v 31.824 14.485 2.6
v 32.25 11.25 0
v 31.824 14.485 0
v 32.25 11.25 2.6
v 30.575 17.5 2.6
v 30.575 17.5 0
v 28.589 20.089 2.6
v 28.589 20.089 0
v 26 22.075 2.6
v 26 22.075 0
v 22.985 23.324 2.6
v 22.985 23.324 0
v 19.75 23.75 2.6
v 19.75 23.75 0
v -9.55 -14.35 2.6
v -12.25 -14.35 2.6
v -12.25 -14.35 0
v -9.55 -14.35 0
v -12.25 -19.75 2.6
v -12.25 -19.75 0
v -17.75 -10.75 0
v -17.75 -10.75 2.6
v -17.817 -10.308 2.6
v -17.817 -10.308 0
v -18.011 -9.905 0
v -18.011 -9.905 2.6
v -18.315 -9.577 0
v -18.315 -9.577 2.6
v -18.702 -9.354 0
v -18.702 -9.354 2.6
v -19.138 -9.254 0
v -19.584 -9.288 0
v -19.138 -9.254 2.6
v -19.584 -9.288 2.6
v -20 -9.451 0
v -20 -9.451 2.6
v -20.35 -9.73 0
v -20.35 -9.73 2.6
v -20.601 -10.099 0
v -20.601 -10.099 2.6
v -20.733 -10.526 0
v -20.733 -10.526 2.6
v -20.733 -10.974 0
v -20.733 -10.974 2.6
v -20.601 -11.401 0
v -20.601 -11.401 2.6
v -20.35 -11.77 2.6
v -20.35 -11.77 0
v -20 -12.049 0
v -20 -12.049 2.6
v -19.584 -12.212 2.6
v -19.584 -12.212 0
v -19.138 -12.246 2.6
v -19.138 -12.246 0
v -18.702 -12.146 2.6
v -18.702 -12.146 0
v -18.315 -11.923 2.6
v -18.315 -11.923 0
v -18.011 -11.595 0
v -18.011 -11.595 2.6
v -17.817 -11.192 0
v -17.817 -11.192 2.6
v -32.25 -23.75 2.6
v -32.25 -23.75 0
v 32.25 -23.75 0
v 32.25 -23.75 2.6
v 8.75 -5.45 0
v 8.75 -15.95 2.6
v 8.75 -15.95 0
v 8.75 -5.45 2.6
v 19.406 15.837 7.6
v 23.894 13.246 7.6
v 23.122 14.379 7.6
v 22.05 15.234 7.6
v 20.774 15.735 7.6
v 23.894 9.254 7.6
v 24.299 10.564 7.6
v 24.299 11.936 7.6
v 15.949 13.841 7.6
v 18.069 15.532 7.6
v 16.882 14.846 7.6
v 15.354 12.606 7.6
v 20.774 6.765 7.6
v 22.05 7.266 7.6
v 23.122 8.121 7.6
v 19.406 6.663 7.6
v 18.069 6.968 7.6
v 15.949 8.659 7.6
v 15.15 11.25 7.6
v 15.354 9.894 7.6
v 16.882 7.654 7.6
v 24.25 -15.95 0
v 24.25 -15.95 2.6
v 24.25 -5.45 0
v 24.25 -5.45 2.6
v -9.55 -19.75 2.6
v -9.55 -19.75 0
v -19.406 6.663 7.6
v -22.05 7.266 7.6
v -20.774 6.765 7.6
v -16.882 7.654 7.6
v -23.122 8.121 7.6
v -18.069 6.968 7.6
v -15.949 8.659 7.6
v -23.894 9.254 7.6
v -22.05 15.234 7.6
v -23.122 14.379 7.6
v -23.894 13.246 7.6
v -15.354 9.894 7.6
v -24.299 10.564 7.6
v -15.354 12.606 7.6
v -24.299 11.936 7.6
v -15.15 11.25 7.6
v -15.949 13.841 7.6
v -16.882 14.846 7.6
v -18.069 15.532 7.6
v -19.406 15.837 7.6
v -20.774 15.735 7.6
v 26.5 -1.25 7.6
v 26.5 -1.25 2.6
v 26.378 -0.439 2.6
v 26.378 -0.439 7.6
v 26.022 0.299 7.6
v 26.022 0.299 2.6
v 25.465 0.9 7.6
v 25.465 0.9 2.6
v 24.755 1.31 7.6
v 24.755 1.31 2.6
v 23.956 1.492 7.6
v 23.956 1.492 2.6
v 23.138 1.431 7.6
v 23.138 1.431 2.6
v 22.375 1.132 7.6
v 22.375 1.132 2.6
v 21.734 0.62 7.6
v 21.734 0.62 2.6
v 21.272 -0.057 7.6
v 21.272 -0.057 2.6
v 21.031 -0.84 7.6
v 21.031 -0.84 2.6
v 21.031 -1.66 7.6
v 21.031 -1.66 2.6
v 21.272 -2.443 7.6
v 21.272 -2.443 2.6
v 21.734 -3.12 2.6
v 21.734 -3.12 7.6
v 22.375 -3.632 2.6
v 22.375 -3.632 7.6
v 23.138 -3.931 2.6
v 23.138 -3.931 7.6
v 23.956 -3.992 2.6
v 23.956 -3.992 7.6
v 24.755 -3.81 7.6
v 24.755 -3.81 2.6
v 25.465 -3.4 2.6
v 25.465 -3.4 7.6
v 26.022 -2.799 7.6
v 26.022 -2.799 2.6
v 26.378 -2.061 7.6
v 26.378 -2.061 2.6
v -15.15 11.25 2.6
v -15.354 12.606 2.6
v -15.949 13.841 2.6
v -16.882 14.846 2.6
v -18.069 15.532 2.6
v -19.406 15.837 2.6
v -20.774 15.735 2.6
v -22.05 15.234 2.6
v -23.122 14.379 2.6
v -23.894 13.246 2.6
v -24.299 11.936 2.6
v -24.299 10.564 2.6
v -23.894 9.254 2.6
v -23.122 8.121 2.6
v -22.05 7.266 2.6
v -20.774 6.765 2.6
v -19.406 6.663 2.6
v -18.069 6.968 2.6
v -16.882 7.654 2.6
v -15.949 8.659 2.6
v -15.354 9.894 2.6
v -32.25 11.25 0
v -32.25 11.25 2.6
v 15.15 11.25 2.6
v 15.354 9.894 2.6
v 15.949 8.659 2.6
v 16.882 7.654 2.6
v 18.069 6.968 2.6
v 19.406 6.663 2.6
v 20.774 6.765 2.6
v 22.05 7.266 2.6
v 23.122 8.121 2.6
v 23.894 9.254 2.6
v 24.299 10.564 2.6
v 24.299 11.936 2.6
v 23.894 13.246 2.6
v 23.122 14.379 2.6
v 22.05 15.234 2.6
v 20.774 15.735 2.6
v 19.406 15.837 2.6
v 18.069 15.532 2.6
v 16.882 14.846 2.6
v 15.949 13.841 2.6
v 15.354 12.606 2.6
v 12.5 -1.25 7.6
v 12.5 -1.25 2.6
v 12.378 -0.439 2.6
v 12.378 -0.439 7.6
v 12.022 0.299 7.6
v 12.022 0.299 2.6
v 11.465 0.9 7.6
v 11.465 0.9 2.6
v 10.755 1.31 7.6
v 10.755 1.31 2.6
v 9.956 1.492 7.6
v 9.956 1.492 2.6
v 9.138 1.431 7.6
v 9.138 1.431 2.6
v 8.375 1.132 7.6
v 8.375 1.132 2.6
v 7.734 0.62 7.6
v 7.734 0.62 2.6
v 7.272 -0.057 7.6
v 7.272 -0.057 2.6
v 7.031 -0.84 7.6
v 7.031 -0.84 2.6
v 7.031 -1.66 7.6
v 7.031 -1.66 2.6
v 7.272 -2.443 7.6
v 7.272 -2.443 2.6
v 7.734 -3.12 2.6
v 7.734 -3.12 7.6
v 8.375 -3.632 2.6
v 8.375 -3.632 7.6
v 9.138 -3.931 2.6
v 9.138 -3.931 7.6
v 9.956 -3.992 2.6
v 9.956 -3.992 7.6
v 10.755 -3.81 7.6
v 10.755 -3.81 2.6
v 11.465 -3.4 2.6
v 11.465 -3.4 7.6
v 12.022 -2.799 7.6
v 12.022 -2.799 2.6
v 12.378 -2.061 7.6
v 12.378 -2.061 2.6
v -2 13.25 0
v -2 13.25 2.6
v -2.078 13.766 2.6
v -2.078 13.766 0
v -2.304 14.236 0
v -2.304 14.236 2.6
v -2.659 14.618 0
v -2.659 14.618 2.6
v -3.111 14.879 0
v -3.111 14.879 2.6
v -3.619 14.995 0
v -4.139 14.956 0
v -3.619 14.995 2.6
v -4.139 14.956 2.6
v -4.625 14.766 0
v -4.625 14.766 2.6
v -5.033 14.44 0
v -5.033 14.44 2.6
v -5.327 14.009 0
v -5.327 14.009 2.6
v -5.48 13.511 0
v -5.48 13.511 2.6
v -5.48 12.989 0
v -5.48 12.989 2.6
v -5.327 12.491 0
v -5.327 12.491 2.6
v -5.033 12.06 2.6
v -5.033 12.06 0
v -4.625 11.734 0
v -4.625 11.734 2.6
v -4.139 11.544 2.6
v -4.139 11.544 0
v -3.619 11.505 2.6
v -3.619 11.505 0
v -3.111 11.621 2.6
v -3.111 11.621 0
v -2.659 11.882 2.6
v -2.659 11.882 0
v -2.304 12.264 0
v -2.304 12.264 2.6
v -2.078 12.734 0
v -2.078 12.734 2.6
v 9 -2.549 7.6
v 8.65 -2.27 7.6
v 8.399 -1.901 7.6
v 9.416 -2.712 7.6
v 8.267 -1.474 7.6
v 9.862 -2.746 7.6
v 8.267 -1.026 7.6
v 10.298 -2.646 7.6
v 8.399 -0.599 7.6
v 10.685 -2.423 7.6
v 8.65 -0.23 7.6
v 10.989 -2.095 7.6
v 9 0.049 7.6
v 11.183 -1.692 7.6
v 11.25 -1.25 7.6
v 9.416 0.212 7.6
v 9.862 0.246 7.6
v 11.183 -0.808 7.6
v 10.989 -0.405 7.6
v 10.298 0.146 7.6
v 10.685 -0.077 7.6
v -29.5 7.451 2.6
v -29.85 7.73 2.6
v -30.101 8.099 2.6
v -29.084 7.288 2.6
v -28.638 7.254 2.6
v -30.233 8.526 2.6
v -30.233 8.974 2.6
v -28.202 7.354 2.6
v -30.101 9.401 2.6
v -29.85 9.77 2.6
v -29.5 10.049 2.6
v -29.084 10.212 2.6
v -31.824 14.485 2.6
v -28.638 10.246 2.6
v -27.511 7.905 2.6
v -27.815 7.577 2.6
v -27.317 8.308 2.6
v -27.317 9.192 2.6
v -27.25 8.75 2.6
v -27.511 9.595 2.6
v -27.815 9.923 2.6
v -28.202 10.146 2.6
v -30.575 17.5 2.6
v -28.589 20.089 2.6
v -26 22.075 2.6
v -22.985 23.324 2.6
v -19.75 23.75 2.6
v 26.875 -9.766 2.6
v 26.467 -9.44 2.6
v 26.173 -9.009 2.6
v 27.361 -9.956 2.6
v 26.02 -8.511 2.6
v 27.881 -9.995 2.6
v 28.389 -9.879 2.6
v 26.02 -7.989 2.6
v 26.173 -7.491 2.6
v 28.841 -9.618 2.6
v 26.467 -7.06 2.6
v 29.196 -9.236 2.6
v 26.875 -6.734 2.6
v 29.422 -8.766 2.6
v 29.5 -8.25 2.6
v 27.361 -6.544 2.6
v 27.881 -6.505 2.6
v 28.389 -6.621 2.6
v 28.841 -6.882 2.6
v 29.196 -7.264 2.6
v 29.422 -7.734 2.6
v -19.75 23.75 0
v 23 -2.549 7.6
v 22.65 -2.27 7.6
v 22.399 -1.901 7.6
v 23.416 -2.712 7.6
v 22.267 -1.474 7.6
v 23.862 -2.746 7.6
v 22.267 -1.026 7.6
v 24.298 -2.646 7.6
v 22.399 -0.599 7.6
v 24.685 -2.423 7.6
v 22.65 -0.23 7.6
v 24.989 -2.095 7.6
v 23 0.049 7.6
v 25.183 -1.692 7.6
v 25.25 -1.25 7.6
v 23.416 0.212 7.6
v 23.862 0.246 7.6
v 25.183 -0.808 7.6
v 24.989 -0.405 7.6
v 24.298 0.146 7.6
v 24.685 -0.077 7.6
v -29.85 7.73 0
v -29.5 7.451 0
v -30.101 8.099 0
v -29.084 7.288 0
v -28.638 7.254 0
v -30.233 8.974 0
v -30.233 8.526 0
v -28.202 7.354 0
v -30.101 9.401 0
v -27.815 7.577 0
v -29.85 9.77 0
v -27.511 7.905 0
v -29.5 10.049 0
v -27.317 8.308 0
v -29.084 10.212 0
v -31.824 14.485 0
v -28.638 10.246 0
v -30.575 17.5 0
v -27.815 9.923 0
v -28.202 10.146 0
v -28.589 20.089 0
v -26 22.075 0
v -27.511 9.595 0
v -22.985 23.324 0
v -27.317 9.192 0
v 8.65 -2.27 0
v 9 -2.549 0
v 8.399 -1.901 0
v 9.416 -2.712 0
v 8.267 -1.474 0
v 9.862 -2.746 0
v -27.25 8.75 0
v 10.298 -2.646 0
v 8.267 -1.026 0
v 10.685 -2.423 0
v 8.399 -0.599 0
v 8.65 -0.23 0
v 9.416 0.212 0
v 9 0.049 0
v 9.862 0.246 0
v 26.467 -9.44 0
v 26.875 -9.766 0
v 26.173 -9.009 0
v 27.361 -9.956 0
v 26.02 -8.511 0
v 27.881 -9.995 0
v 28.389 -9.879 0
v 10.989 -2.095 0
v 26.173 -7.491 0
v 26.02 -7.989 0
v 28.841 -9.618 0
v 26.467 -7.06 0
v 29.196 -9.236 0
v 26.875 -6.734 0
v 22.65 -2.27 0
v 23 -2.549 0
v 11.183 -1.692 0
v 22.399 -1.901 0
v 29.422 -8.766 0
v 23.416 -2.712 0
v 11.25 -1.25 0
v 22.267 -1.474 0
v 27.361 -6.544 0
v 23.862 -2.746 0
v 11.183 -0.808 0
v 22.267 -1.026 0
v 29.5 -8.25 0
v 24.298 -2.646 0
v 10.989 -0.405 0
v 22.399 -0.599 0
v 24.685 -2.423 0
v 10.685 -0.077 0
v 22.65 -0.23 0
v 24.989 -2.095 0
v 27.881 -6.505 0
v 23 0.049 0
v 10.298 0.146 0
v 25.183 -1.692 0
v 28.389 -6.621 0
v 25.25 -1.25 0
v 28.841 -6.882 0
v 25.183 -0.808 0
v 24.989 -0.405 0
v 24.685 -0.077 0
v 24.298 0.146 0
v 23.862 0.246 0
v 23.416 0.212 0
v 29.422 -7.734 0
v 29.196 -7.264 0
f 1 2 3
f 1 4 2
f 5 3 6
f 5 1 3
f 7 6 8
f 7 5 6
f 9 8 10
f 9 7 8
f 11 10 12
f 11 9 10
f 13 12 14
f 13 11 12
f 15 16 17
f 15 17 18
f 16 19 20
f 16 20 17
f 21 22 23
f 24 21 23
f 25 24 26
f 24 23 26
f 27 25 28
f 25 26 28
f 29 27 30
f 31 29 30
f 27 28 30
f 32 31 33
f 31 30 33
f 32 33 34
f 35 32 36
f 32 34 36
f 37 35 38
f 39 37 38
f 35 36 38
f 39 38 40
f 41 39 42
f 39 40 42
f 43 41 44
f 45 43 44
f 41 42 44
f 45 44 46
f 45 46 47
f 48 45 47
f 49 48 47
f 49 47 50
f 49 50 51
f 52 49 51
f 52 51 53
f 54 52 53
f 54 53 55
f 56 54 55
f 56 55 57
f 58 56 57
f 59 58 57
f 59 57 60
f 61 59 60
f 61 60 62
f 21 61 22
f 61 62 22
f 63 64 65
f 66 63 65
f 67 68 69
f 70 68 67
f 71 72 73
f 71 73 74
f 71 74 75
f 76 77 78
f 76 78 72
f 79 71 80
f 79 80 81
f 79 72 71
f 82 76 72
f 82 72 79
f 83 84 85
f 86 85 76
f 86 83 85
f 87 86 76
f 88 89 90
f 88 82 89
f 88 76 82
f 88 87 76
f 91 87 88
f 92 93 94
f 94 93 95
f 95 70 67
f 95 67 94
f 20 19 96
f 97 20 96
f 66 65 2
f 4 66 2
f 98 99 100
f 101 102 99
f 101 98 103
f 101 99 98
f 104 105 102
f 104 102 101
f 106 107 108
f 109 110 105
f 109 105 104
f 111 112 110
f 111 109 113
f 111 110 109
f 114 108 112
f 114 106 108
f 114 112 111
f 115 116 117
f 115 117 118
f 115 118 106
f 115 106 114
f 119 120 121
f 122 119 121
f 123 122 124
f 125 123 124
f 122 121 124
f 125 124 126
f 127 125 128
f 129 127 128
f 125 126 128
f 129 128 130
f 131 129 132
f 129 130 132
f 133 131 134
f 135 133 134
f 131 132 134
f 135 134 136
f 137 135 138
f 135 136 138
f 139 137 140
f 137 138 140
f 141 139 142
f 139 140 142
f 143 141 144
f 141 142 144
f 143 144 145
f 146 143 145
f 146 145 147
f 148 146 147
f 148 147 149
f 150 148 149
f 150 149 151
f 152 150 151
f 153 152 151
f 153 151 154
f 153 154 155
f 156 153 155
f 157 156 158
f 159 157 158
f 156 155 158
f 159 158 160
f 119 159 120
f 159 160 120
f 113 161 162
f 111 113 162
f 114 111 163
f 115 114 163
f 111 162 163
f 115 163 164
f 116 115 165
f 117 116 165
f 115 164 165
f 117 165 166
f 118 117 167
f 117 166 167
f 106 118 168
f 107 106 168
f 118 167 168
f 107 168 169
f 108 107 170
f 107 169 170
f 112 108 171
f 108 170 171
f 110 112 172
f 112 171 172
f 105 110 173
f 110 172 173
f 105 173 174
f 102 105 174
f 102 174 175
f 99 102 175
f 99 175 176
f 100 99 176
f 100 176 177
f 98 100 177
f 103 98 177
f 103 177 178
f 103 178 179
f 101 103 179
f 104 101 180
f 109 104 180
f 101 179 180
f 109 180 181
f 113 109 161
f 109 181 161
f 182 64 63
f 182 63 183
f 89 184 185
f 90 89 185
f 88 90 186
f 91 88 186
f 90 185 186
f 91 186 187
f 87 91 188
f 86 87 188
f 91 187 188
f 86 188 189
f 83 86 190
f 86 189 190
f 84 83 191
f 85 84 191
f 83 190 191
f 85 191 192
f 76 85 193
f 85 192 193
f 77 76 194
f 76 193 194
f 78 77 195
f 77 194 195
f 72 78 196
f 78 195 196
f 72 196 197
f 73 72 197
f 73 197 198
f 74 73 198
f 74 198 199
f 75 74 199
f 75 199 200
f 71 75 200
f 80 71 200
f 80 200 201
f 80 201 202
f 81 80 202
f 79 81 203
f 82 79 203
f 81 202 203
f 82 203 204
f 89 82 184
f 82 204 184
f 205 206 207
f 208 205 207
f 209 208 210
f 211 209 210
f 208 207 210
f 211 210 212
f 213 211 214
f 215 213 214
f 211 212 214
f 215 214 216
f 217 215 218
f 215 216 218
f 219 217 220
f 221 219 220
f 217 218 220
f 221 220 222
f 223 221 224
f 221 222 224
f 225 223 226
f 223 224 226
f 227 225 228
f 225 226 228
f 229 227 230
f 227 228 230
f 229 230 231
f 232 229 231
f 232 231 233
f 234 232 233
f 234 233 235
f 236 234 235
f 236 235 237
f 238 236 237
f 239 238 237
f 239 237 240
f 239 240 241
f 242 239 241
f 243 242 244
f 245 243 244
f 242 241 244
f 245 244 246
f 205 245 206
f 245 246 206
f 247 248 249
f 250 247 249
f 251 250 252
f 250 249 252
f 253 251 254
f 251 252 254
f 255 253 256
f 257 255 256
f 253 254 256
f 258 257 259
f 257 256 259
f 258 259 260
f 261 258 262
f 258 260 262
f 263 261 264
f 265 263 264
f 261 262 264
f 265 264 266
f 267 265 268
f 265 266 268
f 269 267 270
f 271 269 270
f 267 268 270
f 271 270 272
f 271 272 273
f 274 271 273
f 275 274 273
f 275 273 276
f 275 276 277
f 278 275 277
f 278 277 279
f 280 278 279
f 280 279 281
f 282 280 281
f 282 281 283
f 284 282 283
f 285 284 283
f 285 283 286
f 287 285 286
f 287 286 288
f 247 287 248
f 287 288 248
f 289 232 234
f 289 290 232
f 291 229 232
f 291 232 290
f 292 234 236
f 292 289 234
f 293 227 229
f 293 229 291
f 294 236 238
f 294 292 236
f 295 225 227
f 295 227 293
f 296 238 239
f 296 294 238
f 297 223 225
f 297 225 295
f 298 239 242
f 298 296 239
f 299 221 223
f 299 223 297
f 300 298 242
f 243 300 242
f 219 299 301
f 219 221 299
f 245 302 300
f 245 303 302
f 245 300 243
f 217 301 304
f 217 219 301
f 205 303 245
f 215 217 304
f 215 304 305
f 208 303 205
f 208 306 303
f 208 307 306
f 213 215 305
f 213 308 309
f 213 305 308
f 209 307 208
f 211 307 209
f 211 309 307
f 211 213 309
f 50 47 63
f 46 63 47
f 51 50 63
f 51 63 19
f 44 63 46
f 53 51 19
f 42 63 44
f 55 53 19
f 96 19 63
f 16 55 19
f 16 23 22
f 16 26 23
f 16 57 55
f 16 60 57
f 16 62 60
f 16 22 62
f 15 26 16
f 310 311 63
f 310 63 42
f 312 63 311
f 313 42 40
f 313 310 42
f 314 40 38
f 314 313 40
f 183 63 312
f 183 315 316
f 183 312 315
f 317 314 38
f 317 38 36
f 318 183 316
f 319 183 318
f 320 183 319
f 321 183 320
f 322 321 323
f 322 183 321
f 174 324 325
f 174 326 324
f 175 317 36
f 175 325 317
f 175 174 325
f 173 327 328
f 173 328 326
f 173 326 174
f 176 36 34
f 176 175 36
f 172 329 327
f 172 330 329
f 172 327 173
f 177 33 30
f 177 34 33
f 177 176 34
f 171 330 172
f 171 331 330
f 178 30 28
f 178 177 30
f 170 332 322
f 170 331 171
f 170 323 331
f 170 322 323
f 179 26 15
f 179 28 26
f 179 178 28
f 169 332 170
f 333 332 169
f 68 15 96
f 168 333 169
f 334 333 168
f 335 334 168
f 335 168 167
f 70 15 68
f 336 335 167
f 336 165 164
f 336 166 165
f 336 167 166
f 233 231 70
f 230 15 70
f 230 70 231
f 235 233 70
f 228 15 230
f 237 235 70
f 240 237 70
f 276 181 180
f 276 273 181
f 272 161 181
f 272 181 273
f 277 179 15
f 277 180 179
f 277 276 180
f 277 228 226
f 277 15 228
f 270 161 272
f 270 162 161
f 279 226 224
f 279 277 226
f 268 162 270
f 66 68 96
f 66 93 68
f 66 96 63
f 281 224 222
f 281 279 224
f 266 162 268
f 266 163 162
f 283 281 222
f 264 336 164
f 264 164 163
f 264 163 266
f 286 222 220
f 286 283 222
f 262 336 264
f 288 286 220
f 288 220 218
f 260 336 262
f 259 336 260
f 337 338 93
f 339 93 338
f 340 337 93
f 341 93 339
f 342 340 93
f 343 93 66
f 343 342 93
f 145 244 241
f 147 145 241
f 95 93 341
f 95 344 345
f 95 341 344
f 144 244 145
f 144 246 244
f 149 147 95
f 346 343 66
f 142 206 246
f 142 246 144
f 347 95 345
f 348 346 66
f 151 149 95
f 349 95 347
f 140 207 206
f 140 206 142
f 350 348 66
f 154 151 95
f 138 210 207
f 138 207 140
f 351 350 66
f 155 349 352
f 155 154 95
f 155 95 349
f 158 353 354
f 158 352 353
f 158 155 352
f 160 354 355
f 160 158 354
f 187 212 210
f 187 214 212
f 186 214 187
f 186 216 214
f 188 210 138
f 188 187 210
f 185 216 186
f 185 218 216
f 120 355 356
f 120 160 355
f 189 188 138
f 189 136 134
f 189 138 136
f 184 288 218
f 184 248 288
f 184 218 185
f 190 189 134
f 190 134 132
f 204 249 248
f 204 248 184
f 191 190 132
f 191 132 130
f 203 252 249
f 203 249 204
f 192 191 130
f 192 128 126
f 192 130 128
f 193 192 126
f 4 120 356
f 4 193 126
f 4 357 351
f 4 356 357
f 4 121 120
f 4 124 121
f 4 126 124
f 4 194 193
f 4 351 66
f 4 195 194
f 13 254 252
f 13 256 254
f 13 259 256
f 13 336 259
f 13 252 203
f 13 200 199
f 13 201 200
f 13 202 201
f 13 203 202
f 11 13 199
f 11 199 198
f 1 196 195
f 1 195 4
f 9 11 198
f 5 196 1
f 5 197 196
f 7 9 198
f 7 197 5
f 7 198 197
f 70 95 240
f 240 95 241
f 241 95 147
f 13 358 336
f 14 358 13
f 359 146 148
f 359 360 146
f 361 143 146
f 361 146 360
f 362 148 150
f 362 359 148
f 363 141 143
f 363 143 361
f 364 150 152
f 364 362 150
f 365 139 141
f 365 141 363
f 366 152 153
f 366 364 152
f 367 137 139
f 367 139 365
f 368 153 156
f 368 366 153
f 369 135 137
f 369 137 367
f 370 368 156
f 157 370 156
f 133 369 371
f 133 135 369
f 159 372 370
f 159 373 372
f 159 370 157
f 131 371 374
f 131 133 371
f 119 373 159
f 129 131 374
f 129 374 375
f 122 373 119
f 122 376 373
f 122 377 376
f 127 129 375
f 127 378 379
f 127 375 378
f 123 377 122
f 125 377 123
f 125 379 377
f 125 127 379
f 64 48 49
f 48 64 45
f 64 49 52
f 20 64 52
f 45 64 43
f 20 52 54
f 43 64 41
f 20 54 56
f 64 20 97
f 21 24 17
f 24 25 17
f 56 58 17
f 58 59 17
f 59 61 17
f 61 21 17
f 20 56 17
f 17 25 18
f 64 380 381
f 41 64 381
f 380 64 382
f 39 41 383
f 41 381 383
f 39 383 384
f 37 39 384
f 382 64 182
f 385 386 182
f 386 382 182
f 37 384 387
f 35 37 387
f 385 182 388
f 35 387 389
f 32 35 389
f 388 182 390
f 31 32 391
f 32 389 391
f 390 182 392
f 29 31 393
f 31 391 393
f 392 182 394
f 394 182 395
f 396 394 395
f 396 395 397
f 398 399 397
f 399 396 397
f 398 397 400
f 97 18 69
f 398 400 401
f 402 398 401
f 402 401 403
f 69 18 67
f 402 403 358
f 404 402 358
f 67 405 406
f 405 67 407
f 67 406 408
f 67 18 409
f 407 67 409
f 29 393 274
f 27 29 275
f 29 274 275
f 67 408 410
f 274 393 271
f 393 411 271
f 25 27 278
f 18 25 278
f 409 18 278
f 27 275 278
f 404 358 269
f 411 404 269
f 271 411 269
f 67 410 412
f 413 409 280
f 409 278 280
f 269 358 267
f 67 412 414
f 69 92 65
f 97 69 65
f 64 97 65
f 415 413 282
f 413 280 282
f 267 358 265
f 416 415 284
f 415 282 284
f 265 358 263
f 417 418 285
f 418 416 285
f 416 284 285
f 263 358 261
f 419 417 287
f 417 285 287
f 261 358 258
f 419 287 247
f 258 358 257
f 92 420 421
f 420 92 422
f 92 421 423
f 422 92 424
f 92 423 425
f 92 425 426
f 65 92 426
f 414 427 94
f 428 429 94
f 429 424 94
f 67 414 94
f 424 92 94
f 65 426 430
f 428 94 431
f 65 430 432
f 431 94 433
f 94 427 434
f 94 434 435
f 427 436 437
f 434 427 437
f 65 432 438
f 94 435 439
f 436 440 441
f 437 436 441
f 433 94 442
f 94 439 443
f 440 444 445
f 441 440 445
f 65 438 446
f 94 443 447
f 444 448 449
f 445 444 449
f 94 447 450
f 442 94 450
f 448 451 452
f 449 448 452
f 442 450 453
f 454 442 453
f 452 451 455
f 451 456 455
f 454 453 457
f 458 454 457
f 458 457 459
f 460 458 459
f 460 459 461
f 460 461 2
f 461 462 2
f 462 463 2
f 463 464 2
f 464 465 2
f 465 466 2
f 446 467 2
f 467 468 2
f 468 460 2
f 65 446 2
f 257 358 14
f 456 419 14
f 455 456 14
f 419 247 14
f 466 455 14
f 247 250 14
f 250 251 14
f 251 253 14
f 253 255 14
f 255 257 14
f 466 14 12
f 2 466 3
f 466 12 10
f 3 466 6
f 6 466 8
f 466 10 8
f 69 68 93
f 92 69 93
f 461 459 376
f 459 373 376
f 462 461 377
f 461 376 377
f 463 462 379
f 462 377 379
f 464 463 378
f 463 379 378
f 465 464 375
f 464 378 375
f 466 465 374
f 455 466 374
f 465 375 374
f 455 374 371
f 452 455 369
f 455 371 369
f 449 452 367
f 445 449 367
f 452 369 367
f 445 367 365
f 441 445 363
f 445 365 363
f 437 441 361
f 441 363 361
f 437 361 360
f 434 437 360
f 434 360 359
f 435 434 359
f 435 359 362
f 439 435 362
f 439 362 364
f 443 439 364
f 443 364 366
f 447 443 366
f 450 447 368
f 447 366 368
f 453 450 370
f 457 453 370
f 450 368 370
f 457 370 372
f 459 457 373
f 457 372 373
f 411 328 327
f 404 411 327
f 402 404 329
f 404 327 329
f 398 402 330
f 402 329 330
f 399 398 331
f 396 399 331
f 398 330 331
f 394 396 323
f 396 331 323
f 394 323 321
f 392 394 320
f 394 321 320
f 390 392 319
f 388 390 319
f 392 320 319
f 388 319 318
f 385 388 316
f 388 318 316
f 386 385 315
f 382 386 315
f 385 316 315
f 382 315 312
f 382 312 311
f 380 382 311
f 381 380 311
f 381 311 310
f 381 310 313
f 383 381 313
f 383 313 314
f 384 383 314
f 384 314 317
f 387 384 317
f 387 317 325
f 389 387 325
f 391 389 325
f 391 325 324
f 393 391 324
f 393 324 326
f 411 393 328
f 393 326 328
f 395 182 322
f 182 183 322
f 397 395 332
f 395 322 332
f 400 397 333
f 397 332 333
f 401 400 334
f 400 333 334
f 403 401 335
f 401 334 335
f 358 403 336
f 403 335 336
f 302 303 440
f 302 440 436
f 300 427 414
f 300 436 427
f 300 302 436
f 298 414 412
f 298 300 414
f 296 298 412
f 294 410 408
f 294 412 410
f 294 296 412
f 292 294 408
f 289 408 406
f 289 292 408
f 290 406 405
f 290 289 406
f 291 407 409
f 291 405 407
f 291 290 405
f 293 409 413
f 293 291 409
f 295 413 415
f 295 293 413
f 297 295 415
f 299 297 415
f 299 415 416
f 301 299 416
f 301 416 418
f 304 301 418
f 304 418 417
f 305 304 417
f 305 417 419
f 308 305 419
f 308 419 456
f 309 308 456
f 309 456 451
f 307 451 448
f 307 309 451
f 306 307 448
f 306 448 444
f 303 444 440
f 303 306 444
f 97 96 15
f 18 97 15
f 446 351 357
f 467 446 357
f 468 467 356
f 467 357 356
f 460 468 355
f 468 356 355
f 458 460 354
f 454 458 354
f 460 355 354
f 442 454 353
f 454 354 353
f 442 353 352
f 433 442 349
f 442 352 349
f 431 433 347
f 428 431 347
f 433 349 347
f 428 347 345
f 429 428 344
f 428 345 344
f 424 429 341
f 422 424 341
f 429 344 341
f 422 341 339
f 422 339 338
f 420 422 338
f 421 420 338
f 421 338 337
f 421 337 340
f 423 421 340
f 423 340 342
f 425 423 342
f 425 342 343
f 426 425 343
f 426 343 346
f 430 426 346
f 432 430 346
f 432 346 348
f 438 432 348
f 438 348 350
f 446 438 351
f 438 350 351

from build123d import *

# Parameters (mm, degrees)
SKETCH_1_W          = 64.5
SKETCH_1_H          = 47.5
EXTRUDE_1_DEPTH     = 2.6
FILLET_1_R          = 12.5
SKETCH_2_R          = 1.5
SKETCH_2_R_2        = 1.75
SKETCH_2_W          = 2.7
SKETCH_2_H          = 5.4
SKETCH_2_W_2        = 15.5
SKETCH_2_H_2        = 10.5
CUT_EXTRUDE_1_DEPTH = 2.6
SKETCH_3_R          = 4.6
SKETCH_3_R_2        = 2.75
EXTRUDE_2_DEPTH     = 5
CUT_EXTRUDE_START   = -26
SKETCH_4_R          = 1.5
CUT_EXTRUDE_2_DEPTH = 26


with BuildPart() as part:
    # 草图1 → 凸台-拉伸1 (new body)
    with BuildSketch(Plane.XY):
        Rectangle(SKETCH_1_W, SKETCH_1_H)
    extrude(amount=EXTRUDE_1_DEPTH)

    # 圆角1
    fillet_1_edges = [part.edges().sort_by_distance(p)[0] for p in [
        (-32.25, 23.75, 1.3),
        (32.25, 23.75, 1.3),
    ]]
    fillet(fillet_1_edges, radius=FILLET_1_R)

    # 草图2 → 切除-拉伸1 (cut)
    with BuildSketch(Plane.XY.offset(2.6)):
        with Locations((-19.25, -10.75)):
            Circle(SKETCH_2_R)
        with Locations((-28.75, 8.75)):
            Circle(SKETCH_2_R)
        with Locations((27.75, -8.25)):
            Circle(SKETCH_2_R_2)
        with Locations((23.75, -1.25)):
            Circle(SKETCH_2_R)
        with Locations((9.75, -1.25)):
            Circle(SKETCH_2_R)
        with Locations((-3.75, 13.25)):
            Circle(SKETCH_2_R_2)
        with Locations((-10.9, -17.05)):
            Rectangle(SKETCH_2_W, SKETCH_2_H)
        with Locations((16.5, -10.7)):
            Rectangle(SKETCH_2_W_2, SKETCH_2_H_2)
    extrude(amount=-CUT_EXTRUDE_1_DEPTH, mode=Mode.SUBTRACT)

    # 草图3 → 凸台-拉伸2 (add)
    with BuildSketch(Plane.XY.offset(2.6)):
        with Locations((-19.75, 11.25)):
            Circle(SKETCH_3_R)
        with Locations(Location((19.75, 11.25, 0), (0, 0, 180))):
            Circle(SKETCH_3_R)
        with Locations((9.75, -1.25)):
            Circle(SKETCH_3_R_2)
        with Locations((23.75, -1.25)):
            Circle(SKETCH_3_R_2)
    extrude(amount=EXTRUDE_2_DEPTH)

    # 草图4 → 切除-拉伸2 (cut)
    with BuildSketch(Plane(origin=(0, 0, 0), x_dir=(-1, 0, 0), z_dir=(0, 0, -1)).offset(CUT_EXTRUDE_START)):
        with Locations(Location((-23.75, -1.25, 0), (0, 0, 180))):
            Circle(SKETCH_4_R)
        with Locations(Location((-9.75, -1.25, 0), (0, 0, 180))):
            Circle(SKETCH_4_R)
    extrude(amount=CUT_EXTRUDE_2_DEPTH, mode=Mode.SUBTRACT)


solid = part.part
